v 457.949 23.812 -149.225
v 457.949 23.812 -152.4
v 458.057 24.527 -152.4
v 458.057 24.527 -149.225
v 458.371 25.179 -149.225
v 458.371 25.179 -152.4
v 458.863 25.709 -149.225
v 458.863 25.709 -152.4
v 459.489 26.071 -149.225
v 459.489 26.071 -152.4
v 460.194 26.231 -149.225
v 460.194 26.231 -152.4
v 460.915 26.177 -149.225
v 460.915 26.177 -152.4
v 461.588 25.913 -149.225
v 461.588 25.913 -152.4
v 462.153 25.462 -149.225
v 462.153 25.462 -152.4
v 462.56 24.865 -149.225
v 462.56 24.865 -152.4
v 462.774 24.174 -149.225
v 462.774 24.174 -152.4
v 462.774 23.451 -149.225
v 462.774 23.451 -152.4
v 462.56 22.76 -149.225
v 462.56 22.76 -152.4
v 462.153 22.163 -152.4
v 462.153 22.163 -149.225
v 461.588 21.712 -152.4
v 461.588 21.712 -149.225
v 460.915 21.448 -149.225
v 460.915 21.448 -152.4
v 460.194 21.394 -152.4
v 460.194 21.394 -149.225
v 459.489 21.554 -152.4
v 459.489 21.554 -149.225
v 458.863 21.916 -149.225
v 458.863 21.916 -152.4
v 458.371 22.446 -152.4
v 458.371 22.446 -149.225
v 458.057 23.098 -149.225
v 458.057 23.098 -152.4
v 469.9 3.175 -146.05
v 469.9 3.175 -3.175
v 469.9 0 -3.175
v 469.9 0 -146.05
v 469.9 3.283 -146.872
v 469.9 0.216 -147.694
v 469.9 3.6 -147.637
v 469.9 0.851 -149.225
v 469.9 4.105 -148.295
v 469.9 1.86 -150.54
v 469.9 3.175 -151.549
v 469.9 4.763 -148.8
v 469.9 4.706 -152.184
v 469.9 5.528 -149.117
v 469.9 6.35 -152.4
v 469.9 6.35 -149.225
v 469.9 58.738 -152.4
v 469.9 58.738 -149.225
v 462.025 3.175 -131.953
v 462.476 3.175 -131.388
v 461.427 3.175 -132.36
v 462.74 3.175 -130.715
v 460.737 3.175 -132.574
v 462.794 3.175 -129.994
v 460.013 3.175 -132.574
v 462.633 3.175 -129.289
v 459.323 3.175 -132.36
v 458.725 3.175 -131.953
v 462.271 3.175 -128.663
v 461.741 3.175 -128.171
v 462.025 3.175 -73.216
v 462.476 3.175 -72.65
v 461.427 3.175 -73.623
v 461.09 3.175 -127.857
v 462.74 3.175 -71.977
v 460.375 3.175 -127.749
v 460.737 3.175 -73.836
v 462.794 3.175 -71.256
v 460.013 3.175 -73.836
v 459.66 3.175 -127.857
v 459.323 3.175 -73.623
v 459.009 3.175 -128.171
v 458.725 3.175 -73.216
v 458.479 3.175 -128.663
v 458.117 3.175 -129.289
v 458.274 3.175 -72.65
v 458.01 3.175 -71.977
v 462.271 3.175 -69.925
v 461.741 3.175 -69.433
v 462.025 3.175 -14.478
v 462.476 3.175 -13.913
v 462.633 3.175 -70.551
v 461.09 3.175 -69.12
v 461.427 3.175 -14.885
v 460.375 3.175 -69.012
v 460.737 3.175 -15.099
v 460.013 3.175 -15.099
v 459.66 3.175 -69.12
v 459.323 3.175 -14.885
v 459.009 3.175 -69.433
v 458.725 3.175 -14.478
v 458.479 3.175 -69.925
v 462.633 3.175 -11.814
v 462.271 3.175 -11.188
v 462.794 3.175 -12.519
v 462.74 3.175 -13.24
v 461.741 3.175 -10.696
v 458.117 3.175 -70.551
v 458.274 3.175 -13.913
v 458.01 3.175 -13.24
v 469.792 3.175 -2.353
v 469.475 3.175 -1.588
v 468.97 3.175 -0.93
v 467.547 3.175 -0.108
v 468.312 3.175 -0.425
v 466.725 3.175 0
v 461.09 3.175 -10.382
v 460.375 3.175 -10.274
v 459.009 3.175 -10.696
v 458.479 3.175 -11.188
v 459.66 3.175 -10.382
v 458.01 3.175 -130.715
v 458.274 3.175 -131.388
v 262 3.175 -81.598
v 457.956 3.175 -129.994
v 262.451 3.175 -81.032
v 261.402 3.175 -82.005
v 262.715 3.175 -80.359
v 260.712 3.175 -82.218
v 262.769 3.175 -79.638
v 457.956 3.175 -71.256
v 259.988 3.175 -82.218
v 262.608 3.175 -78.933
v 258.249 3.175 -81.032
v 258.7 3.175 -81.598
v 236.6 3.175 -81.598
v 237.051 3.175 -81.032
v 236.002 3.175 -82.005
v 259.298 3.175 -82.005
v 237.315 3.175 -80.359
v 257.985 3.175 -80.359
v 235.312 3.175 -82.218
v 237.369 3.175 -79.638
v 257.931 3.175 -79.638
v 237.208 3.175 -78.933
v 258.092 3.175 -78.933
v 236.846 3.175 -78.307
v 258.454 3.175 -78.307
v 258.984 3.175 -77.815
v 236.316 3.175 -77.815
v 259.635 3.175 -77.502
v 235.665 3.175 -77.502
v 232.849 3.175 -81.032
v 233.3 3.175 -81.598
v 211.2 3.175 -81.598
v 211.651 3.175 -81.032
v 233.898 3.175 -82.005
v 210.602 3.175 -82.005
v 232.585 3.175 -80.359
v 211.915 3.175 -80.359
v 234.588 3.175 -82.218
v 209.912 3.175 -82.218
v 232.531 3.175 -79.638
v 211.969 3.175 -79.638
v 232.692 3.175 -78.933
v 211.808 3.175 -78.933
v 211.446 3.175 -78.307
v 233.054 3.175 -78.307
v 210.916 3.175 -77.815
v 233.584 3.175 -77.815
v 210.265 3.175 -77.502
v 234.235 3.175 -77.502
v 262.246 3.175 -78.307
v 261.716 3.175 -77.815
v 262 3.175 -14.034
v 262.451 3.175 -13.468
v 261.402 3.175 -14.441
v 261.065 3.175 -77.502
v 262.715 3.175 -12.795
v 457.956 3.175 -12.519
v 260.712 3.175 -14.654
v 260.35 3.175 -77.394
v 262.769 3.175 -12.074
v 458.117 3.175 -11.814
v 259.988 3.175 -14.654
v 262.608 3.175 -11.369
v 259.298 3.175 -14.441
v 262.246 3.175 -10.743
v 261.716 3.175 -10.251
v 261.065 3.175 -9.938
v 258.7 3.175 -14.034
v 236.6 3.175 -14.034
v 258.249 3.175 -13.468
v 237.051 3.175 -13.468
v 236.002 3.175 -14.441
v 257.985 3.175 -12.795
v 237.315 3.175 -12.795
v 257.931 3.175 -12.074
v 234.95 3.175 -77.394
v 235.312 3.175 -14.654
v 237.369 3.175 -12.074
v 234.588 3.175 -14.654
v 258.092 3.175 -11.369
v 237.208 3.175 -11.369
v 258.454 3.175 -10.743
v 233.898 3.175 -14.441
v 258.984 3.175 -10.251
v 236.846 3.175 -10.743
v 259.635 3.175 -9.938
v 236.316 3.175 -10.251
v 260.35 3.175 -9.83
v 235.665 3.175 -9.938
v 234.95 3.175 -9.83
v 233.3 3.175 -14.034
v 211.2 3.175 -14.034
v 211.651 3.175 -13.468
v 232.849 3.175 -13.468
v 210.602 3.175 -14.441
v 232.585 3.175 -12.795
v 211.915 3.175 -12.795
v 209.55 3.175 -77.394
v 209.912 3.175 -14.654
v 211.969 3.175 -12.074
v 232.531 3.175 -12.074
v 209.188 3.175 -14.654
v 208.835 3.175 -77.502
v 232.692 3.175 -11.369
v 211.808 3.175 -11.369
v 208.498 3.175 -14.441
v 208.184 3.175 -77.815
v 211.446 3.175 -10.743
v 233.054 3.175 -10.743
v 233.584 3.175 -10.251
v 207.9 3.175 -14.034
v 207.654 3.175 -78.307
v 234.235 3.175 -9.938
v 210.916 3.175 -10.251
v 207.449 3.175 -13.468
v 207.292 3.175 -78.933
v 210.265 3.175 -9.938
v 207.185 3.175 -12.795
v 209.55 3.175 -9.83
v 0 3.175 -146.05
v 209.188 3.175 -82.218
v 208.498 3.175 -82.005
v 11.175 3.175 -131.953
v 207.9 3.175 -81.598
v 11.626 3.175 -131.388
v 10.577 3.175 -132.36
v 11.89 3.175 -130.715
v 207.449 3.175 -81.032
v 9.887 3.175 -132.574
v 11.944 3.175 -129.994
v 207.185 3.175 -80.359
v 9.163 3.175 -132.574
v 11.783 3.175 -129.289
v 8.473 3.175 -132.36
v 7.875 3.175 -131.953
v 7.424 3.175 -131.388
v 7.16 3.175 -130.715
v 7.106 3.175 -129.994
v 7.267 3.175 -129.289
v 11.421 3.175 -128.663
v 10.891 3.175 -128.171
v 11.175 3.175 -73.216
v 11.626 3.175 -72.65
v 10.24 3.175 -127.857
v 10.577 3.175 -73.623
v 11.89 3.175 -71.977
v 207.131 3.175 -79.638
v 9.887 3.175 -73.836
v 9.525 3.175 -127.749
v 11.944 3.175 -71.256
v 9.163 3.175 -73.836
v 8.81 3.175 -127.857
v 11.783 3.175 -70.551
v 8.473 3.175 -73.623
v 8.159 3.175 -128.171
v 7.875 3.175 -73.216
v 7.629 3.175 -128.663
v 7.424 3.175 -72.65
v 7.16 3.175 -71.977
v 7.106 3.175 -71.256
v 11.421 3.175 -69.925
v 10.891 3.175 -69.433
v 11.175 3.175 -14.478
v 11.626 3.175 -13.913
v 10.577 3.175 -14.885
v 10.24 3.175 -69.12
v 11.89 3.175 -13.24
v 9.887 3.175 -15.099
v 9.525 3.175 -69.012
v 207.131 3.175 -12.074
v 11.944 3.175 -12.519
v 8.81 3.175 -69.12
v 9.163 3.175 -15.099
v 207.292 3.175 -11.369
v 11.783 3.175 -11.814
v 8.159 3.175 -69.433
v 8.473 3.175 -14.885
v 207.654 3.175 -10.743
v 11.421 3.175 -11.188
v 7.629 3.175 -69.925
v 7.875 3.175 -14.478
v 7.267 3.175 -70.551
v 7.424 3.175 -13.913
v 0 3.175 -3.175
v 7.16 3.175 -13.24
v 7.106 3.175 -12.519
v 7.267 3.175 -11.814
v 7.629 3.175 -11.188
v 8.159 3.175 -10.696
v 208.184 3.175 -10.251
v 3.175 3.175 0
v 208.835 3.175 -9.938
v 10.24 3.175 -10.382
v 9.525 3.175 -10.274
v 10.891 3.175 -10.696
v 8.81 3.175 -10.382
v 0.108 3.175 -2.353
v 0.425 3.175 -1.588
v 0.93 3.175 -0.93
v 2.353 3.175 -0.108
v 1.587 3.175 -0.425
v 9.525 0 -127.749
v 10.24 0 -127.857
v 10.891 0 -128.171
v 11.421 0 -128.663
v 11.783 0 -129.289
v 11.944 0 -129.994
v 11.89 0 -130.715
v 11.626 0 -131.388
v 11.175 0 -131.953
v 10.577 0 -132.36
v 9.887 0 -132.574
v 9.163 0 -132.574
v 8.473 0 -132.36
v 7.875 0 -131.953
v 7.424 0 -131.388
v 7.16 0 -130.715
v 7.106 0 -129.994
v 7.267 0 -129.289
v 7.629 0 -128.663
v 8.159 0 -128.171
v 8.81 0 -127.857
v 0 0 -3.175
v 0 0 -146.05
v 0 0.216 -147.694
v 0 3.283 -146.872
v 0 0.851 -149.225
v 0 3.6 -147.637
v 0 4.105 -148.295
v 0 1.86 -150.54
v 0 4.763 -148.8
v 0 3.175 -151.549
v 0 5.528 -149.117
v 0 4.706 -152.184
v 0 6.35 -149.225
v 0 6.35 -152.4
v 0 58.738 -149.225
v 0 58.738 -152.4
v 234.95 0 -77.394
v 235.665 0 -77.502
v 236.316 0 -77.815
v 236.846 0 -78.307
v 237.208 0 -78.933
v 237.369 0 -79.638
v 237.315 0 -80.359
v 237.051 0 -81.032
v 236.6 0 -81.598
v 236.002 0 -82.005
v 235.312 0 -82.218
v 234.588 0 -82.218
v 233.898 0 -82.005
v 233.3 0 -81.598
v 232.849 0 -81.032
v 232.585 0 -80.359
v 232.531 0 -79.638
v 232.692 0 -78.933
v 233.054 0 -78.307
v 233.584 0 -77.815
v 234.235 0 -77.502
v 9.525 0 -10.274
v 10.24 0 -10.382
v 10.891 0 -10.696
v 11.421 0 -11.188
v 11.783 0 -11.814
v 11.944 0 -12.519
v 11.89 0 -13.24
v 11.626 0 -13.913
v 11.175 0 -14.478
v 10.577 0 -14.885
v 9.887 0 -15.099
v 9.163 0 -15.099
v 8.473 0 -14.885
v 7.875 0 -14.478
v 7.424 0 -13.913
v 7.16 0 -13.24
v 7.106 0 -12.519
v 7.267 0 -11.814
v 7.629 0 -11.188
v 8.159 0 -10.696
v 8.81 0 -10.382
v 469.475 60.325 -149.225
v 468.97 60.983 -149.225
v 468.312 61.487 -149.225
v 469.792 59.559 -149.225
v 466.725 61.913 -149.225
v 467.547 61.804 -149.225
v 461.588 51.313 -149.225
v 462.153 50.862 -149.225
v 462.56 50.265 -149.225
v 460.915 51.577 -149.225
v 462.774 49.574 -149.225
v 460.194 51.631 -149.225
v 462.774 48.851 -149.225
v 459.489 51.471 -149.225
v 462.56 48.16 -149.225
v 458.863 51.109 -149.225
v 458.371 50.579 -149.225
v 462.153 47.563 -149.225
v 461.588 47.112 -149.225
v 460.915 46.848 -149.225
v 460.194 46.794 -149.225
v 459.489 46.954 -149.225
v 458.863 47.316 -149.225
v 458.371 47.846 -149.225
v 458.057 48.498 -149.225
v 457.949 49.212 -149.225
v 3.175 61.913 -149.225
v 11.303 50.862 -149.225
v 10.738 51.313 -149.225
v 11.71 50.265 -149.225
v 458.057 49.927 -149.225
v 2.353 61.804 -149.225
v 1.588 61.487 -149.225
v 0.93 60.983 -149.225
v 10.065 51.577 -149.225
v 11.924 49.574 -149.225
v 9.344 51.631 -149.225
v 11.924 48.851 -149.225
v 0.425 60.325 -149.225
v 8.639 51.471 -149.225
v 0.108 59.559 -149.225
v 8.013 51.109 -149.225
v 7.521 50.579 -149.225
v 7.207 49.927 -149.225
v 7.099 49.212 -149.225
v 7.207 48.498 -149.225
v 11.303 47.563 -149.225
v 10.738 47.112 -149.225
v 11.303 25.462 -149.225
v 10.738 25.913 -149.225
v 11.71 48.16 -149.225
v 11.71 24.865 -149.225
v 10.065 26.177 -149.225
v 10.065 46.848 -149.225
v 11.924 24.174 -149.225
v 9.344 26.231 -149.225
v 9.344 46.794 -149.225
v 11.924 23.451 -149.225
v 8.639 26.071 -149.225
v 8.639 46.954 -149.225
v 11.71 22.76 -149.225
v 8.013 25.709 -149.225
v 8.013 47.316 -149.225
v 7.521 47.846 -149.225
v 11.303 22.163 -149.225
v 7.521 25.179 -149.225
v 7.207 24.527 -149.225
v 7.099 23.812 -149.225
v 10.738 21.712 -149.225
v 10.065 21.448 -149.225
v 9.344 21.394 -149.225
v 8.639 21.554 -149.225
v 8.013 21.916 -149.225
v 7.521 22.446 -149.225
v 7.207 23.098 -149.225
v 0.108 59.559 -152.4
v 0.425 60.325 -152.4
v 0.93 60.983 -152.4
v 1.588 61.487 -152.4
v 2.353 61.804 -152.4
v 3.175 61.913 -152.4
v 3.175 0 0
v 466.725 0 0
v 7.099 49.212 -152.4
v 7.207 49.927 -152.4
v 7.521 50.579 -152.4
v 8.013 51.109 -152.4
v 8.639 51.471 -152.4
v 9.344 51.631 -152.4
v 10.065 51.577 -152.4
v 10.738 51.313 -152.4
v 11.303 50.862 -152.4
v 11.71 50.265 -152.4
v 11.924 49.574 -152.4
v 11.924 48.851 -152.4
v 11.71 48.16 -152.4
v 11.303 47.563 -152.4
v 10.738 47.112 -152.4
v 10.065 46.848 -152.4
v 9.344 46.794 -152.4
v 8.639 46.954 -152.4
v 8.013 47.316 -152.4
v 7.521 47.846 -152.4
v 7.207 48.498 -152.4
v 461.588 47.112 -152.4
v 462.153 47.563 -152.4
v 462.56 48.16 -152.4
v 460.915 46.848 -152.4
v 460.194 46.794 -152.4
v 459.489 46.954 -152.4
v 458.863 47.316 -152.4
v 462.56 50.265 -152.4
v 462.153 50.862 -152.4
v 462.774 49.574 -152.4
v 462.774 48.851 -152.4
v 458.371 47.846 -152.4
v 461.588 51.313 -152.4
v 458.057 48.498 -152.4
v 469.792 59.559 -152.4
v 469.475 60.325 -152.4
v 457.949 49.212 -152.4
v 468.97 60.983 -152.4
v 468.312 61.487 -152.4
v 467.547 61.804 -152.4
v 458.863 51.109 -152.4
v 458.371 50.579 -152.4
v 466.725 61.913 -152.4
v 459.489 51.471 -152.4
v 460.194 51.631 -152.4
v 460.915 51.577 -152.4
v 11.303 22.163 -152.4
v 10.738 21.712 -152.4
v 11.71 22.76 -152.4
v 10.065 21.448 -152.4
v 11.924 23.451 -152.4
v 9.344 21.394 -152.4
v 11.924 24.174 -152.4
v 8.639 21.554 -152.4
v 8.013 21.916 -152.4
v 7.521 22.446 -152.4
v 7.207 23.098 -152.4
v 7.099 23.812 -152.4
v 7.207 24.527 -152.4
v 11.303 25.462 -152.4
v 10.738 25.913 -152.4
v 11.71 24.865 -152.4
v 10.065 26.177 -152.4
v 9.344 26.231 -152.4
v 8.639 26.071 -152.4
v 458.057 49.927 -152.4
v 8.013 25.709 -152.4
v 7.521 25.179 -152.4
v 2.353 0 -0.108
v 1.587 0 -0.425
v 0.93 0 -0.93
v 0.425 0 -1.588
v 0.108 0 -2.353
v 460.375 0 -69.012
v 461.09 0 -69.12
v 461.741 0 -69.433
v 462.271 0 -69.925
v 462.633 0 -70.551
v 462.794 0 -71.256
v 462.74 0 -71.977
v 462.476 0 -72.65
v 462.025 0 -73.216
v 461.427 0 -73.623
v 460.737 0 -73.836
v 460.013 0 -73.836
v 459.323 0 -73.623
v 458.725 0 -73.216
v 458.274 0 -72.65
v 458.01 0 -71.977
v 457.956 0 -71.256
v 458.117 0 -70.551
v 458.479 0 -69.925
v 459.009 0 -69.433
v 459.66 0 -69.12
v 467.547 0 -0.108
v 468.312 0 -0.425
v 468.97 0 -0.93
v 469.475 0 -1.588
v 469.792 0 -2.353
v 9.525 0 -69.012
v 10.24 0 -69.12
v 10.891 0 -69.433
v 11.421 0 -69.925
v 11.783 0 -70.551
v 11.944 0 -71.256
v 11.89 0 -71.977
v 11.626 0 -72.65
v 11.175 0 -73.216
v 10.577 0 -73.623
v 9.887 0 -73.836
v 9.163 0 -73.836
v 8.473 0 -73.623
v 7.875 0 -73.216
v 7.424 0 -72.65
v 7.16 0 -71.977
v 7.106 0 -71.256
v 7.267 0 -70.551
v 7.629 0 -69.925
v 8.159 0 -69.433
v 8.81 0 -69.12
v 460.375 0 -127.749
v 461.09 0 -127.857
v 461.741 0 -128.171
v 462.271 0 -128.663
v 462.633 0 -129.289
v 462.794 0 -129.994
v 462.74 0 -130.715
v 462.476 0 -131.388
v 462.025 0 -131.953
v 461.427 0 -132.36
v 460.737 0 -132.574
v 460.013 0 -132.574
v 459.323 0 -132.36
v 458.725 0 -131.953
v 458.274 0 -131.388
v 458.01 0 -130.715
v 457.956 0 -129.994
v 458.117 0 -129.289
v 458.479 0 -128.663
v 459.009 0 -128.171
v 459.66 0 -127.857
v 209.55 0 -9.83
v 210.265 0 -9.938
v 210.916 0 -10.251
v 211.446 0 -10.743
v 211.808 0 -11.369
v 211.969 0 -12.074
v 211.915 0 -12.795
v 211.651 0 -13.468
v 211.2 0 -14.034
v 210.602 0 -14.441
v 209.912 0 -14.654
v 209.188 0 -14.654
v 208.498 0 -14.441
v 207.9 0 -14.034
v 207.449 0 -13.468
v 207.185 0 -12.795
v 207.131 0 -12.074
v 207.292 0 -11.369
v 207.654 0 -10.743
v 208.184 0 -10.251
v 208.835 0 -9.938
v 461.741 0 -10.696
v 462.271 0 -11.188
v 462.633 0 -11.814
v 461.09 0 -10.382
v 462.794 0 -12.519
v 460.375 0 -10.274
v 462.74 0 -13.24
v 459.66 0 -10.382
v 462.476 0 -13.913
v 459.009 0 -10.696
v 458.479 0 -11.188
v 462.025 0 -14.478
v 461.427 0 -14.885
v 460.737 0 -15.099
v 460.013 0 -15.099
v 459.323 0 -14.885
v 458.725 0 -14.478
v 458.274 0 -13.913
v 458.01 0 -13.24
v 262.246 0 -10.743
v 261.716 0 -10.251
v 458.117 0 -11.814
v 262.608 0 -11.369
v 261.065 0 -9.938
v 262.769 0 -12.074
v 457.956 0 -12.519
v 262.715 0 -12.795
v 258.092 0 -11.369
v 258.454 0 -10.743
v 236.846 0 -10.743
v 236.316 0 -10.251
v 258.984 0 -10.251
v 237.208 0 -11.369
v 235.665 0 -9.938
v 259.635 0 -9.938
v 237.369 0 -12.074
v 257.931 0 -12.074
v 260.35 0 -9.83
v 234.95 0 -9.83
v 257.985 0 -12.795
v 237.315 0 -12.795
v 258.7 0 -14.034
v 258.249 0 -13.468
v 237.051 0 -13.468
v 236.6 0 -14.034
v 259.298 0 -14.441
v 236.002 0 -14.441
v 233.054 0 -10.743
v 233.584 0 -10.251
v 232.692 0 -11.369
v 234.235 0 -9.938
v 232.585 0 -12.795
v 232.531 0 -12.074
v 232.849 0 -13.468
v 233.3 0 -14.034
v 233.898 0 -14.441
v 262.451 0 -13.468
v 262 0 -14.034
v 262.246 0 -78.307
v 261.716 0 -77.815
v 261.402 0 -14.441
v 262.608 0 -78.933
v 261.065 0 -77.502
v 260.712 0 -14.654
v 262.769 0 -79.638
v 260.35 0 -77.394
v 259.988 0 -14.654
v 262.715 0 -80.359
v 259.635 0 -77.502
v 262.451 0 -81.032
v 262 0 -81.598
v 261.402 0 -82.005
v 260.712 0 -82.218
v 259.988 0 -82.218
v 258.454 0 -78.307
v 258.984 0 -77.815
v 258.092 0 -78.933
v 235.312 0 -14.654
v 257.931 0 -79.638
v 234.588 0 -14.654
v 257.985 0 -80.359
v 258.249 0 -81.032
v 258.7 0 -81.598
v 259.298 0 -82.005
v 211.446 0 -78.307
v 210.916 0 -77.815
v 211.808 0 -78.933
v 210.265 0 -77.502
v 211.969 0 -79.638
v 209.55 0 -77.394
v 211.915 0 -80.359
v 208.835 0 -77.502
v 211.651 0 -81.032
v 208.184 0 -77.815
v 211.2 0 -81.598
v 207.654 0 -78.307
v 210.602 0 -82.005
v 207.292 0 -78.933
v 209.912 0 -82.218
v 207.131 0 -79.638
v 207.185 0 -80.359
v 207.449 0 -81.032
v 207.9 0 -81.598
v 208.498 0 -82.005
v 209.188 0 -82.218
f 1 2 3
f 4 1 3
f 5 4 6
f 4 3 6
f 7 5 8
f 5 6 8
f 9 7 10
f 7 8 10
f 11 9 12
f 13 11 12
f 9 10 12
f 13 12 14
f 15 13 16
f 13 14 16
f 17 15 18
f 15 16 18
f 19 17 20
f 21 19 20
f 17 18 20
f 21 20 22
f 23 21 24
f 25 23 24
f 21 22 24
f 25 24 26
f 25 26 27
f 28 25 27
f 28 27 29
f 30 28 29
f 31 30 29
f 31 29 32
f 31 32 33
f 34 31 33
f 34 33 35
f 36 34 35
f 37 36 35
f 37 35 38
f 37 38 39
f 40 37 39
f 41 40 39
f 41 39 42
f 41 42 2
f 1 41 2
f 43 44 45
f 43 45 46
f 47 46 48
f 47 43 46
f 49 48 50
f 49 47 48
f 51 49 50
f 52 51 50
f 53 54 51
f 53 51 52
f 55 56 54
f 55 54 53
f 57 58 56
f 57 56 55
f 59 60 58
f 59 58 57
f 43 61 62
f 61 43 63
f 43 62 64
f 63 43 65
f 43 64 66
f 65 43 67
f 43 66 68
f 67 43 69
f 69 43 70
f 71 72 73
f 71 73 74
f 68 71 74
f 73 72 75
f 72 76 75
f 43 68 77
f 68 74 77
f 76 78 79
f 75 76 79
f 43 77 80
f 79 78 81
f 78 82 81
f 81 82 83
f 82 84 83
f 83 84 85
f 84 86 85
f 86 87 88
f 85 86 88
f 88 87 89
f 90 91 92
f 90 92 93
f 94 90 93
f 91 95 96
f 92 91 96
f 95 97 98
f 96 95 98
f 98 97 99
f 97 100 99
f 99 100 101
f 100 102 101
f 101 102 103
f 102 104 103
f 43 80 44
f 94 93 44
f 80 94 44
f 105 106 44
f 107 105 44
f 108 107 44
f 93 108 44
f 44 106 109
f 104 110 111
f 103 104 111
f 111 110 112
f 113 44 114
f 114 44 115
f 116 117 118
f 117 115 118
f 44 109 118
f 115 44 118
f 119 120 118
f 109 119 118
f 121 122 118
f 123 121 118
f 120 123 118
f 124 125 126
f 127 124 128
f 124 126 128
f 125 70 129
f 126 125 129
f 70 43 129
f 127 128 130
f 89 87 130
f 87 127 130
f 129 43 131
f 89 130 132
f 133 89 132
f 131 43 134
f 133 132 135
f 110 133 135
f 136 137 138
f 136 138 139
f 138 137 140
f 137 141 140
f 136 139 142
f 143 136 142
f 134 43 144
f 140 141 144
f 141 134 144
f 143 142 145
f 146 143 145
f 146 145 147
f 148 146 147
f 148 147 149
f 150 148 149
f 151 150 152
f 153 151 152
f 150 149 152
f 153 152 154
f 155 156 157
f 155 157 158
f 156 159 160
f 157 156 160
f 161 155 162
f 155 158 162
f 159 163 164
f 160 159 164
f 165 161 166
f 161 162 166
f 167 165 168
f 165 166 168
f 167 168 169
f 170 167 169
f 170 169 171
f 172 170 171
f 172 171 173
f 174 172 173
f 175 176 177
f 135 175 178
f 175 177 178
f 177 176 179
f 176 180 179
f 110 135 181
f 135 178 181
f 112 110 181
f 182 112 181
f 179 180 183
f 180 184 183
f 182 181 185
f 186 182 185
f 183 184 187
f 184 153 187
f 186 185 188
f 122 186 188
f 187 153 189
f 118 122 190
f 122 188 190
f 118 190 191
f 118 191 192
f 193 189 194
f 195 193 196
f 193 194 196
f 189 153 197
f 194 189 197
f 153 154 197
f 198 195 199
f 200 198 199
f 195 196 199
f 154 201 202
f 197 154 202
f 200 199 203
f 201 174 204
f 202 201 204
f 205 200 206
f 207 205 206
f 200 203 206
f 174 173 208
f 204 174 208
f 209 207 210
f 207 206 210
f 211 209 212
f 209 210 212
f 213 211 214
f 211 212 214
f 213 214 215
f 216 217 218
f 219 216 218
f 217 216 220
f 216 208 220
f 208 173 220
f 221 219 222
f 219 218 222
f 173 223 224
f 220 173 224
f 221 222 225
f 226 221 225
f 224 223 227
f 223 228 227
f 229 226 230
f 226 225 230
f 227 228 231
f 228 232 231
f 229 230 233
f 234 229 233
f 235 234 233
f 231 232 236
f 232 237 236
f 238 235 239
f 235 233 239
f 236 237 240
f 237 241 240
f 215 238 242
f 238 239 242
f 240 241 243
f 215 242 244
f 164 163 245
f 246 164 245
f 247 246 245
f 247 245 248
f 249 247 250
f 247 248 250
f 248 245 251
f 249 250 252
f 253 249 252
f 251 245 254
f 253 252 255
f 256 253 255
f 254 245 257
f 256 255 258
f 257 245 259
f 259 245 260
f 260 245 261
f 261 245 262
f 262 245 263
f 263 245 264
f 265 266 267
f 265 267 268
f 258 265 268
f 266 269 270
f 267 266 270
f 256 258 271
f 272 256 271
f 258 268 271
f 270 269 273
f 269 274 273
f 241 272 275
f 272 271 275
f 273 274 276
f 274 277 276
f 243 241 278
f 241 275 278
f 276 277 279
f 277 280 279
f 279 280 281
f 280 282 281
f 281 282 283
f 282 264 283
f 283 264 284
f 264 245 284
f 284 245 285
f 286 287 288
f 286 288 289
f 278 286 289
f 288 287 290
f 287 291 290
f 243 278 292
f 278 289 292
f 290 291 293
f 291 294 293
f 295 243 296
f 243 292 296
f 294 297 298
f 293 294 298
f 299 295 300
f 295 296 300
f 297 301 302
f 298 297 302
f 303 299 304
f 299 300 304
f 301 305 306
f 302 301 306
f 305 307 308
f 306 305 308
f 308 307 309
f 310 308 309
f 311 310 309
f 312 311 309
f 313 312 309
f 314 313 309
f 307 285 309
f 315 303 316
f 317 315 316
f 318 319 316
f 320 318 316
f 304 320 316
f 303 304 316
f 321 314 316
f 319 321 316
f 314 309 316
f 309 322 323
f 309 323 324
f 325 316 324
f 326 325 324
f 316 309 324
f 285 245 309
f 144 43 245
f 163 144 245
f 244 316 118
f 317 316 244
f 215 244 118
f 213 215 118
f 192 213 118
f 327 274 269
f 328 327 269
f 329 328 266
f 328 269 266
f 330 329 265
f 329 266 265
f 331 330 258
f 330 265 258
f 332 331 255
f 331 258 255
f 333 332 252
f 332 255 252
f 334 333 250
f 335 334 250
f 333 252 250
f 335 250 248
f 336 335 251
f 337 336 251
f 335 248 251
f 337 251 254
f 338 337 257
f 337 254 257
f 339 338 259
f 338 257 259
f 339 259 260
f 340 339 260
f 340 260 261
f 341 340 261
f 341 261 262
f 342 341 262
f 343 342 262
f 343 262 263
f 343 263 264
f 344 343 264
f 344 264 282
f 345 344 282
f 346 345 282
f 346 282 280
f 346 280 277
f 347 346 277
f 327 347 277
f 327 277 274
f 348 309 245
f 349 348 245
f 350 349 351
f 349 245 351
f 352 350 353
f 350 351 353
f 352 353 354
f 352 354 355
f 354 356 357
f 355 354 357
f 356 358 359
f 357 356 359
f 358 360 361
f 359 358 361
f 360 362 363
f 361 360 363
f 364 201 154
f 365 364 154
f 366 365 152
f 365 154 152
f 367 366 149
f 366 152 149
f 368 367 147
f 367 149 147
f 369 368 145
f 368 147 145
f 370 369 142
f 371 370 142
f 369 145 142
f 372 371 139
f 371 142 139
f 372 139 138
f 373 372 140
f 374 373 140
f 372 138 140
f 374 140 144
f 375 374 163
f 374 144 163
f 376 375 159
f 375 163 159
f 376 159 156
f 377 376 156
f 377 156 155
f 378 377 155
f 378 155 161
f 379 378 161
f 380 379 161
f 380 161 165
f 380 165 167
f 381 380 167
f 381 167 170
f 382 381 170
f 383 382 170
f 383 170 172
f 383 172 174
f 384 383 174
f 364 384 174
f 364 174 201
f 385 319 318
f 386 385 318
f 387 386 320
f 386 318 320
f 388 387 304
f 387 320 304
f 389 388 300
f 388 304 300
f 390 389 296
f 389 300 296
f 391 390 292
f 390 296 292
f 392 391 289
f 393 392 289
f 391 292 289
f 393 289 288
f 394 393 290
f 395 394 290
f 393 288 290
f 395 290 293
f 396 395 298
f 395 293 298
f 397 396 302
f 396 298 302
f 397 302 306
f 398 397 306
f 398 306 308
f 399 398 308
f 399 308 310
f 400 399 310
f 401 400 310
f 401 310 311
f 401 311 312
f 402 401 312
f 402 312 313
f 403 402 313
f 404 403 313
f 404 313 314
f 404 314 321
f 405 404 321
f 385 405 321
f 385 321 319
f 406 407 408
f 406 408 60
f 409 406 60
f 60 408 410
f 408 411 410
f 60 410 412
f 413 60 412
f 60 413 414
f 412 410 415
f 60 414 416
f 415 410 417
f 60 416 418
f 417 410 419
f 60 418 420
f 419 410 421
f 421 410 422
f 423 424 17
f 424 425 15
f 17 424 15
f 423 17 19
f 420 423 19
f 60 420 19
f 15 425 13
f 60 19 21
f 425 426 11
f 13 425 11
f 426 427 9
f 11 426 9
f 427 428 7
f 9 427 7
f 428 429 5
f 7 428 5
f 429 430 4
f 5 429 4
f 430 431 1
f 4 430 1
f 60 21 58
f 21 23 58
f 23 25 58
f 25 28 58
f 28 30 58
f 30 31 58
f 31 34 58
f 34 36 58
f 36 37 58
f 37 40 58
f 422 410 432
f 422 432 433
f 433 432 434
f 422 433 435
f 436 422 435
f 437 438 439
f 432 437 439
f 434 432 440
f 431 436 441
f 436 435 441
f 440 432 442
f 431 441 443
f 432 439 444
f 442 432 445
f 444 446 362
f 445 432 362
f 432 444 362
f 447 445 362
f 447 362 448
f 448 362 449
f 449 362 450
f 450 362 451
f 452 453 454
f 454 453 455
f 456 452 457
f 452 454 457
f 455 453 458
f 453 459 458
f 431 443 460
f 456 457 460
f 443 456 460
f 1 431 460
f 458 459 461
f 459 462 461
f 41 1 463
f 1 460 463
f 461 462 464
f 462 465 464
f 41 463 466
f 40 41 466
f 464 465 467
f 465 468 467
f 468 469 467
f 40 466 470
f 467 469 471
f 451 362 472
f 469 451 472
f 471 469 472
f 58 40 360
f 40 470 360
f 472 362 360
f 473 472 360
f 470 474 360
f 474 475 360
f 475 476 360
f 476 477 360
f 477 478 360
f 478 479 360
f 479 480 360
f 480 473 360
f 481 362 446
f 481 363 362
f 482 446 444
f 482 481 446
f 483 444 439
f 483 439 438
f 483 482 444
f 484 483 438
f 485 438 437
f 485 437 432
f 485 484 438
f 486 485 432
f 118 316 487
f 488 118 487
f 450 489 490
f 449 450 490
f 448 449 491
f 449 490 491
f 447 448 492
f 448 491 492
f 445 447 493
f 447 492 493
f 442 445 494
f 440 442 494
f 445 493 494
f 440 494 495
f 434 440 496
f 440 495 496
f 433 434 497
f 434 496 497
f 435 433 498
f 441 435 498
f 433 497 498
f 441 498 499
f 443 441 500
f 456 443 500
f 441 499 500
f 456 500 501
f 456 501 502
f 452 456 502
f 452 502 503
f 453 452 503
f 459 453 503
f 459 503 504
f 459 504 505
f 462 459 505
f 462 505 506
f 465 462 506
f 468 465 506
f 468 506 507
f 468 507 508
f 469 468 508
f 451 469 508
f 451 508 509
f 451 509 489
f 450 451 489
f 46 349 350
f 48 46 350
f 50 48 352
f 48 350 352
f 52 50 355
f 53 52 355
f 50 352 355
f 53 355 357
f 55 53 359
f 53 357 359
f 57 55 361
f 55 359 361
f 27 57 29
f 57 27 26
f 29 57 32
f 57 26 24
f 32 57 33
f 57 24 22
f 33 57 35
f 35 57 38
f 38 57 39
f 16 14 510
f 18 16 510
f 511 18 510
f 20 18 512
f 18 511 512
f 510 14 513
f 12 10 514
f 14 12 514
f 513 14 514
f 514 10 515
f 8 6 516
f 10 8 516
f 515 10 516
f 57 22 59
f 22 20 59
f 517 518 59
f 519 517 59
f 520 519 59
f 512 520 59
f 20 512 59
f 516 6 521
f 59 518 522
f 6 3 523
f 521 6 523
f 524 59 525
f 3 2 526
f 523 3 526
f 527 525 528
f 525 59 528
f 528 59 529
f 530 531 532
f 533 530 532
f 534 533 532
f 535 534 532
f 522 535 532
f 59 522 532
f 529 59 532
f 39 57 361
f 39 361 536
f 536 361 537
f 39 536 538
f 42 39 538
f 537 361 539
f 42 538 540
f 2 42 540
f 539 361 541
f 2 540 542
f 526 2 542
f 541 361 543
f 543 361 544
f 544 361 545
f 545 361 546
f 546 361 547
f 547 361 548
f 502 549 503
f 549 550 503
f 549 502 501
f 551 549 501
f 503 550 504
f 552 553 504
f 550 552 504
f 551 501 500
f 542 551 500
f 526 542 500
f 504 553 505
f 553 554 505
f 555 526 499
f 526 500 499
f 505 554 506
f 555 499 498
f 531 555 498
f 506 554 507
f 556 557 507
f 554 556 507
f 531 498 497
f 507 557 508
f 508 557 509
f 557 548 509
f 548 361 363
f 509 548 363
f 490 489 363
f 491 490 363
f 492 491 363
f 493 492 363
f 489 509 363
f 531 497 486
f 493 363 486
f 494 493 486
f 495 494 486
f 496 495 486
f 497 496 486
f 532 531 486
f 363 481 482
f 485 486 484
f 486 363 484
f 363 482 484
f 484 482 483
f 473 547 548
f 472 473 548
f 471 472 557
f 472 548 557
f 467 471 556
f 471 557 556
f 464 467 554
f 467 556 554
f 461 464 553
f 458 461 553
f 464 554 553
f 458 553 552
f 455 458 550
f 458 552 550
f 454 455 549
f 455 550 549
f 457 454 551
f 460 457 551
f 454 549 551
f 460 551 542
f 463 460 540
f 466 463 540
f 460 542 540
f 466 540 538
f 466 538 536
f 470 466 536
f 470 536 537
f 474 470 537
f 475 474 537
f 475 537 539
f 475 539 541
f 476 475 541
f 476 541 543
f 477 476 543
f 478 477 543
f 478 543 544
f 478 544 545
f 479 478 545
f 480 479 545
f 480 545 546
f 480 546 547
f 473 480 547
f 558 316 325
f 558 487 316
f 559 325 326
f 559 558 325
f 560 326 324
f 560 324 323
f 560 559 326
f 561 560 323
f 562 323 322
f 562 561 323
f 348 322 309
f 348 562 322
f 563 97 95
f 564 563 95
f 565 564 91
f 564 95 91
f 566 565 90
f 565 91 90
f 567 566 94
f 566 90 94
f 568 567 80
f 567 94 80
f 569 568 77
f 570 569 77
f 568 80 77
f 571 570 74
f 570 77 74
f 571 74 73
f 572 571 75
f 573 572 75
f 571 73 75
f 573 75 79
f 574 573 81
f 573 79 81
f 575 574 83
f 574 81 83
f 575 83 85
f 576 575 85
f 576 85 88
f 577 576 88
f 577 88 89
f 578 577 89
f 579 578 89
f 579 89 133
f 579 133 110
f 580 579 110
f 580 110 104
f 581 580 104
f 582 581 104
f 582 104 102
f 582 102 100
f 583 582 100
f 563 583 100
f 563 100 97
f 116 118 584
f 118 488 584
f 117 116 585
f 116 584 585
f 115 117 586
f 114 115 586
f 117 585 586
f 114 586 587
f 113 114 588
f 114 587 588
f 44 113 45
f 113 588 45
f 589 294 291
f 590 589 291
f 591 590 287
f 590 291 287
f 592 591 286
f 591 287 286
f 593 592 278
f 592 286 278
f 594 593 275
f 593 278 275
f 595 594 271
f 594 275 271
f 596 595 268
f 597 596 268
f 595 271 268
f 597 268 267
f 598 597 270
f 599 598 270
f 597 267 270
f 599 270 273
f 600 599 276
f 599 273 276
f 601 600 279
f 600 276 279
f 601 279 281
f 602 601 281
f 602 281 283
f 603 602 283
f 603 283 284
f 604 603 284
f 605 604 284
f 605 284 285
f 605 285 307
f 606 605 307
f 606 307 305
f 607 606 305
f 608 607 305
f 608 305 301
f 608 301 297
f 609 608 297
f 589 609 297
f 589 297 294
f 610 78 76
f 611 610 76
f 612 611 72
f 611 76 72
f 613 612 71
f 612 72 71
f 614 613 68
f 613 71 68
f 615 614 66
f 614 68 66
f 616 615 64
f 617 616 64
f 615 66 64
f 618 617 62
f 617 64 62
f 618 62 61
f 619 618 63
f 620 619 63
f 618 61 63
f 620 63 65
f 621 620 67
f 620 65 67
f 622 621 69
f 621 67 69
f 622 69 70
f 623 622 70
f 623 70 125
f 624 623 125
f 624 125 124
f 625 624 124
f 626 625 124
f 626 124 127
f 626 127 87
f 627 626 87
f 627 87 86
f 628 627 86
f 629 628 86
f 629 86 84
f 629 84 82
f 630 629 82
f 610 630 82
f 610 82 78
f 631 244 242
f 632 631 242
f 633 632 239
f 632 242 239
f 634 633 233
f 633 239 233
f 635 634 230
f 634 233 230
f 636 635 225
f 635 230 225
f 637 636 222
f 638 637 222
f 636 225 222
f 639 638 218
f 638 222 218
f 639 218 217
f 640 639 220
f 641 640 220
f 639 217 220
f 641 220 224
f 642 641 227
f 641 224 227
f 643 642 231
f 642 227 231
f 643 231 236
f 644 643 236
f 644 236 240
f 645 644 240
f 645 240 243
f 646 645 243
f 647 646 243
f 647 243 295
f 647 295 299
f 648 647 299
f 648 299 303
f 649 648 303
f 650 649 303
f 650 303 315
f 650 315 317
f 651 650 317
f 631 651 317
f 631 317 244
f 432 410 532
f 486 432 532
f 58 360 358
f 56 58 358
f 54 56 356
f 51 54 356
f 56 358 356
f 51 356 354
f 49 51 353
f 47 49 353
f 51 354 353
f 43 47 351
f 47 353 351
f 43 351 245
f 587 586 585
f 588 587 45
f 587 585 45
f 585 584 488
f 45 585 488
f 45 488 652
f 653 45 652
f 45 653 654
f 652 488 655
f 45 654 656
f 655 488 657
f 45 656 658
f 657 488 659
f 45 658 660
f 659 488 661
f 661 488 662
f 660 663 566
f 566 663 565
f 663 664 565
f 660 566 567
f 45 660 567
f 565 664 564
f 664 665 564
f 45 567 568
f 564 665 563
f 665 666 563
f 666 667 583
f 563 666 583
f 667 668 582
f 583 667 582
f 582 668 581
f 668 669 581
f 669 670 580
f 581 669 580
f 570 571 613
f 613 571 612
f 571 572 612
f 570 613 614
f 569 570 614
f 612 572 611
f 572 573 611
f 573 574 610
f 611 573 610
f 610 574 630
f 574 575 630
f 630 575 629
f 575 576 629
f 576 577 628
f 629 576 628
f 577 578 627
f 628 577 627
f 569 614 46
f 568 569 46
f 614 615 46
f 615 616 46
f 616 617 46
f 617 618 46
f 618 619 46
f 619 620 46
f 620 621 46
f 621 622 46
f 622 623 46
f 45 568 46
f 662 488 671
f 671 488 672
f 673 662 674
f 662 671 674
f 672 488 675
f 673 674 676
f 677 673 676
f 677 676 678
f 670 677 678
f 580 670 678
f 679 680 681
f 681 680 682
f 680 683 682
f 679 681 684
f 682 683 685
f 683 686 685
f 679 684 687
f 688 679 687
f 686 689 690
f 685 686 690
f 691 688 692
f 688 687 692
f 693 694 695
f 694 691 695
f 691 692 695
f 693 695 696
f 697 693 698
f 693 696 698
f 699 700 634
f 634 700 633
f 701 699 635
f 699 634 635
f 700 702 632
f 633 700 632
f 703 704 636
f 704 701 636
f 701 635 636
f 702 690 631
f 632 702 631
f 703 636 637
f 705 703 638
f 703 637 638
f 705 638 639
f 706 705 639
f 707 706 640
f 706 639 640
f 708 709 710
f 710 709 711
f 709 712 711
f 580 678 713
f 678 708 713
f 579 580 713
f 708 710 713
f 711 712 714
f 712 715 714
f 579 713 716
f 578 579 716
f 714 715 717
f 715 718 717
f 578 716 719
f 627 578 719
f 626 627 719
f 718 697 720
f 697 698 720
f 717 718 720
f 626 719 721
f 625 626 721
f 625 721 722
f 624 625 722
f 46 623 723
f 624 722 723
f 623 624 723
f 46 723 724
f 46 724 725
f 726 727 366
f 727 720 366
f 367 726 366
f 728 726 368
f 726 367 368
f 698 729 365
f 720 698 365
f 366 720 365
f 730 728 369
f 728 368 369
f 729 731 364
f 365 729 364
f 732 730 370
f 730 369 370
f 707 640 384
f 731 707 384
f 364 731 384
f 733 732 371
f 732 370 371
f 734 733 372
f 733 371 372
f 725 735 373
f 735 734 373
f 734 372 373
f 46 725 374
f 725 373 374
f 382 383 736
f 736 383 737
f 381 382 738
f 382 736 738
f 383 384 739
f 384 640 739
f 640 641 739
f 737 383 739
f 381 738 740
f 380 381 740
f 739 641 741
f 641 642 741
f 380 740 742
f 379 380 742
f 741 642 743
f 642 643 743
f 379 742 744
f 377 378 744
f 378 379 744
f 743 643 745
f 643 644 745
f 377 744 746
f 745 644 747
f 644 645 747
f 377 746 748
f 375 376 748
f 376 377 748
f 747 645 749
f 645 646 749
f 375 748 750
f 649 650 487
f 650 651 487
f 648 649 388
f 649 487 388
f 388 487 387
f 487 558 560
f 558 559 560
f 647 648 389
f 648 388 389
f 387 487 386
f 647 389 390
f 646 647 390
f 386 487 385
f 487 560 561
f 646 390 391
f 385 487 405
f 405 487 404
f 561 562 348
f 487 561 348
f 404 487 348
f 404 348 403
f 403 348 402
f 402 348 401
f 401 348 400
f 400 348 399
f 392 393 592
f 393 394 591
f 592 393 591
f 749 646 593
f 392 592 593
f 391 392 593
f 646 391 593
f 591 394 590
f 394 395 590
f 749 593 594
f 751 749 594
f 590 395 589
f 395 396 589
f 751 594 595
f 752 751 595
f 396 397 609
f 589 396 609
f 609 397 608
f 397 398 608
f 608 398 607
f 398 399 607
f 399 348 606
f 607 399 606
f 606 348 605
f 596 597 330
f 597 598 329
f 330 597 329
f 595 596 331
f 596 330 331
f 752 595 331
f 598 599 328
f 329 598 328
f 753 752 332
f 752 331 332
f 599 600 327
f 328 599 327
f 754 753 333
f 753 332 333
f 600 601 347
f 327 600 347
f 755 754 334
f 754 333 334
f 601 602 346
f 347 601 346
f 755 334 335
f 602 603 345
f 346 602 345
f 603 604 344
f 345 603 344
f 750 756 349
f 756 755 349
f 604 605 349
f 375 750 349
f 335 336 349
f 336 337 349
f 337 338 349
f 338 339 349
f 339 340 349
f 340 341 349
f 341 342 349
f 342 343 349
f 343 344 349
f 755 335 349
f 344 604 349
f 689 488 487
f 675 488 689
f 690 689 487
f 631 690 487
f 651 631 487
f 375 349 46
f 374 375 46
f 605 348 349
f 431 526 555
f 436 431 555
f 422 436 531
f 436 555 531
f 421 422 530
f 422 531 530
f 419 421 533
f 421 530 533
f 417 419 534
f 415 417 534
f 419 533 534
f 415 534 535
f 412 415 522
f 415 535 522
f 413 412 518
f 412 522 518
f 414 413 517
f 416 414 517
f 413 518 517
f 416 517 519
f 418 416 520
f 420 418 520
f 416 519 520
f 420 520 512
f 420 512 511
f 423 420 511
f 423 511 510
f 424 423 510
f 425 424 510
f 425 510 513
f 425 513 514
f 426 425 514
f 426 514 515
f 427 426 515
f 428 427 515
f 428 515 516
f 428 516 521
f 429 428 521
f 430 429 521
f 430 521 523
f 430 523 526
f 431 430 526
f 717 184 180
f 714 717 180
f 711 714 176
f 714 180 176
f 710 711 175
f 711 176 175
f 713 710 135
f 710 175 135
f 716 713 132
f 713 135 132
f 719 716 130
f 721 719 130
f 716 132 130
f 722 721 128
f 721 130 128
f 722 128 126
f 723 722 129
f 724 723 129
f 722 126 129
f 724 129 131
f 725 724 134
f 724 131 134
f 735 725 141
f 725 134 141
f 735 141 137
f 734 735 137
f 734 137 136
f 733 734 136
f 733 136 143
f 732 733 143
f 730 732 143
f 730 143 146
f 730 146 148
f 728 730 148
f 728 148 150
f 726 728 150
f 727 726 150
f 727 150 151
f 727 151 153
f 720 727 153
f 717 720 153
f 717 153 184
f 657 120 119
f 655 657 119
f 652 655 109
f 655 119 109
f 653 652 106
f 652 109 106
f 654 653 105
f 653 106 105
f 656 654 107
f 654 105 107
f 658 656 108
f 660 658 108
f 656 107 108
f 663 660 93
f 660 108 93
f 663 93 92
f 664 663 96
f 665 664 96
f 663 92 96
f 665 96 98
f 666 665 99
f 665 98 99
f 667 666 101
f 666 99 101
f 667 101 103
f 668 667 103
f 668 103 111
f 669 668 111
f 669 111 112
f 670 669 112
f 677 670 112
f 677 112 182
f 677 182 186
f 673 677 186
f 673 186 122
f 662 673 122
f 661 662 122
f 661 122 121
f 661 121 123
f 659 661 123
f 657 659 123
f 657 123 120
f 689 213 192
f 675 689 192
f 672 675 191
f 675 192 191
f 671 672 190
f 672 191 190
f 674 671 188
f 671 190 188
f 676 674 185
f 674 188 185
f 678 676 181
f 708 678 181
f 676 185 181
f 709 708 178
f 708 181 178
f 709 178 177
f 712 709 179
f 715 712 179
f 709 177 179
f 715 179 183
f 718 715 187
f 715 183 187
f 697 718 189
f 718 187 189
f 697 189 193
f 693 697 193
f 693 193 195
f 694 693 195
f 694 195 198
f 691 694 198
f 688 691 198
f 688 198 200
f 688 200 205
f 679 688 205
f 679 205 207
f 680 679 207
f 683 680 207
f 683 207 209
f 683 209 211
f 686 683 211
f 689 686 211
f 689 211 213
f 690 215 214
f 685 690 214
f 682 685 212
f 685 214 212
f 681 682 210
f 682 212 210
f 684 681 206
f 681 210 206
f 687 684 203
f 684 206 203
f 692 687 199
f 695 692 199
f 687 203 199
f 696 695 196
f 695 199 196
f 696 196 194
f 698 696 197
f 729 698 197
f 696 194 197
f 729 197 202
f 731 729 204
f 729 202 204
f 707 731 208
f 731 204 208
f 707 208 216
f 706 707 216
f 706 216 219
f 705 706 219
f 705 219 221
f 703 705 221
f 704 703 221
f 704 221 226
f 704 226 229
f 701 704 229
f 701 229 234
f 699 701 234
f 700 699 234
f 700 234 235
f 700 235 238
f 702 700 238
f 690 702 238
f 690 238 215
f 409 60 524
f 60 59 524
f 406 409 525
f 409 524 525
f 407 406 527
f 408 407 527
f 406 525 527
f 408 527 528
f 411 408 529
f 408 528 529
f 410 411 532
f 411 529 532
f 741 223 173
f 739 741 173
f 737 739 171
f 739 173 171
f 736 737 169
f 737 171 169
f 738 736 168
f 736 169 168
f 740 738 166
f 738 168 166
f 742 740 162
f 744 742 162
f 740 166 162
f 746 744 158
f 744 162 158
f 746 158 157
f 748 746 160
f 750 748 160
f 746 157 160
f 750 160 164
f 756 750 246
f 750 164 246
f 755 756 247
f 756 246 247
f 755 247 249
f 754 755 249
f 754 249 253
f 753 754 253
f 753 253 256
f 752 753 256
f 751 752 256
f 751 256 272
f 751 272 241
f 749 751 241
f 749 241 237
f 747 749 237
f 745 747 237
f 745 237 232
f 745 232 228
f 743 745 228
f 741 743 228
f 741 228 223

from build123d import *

# Parameters (mm, degrees)
BASE_FLANGE1_DEPTH = 469.9
SKETCH6_R          = 21.9075
CUT_EXTRUDE1_DEPTH = 3.175
SKETCH7_R          = 2.4257
CUT_EXTRUDE2_DEPTH = 510.278313523
SKETCH8_R          = 2.4257
CUT_EXTRUDE3_DEPTH = 510.278313523
SKETCH9_R          = 2.4257
CUT_EXTRUDE4_DEPTH = 510.278313523
FILLET1_R          = 3.175
SKETCH10_W         = 152.4
SKETCH10_H         = 61.9125
CUT_EXTRUDE6_DEPTH = 510.278313523
FILLET2_R          = 3.175


# Sheet-metal steps are written as plain solids
with BuildPart() as part:
    # Sketch1 → Base-Flange1 (new body)
    with BuildSketch(Plane(origin=(0, 0, 0), x_dir=(0, 0, -1), z_dir=(1, 0, 0))):
        with BuildLine():
            Line((0, 0), (146.05, 0))
            ThreePointArc((146.05, 0), (150.540128061, 1.859871939), (152.4, 6.35))
            Line((152.4, 6.35), (152.4, 117.475))
            ThreePointArc((152.4, 117.475), (150.540128061, 121.965128061), (146.05, 123.825))
            Line((146.05, 123.825), (0, 123.825))
            Line((0, 123.825), (0, 120.65))
            Line((0, 120.65), (146.05, 120.65))
            ThreePointArc((146.05, 120.65), (148.29506403, 119.72006403), (149.225, 117.475))
            Line((149.225, 117.475), (149.225, 6.35))
            ThreePointArc((149.225, 6.35), (148.29506403, 4.10493597), (146.05, 3.175))
            Line((146.05, 3.175), (0, 3.175))
            Line((0, 3.175), (0, 0))
        make_face()
    extrude(amount=BASE_FLANGE1_DEPTH)

    # Sketch6 → Cut-Extrude1 (cut)
    with BuildSketch(Plane(origin=(0, 123.825, 0), x_dir=(1, 0, 0), z_dir=(0, 1, 0))):
        with Locations(Location((234.95, 46.0375, 0), (0, 0, 270))):
            Circle(SKETCH6_R)
    extrude(amount=-CUT_EXTRUDE1_DEPTH, mode=Mode.SUBTRACT)

    # Sketch7 → Cut-Extrude2 (cut, through all)
    with BuildSketch(Plane(origin=(0, 123.825, 0), x_dir=(1, 0, 0), z_dir=(0, 1, 0))):
        with Locations(Location((234.95, 12.2555, 0), (0, 0, 270))):
            Circle(SKETCH7_R)
        with Locations(Location((234.95, 79.8195, 0), (0, 0, 270))):
            Circle(SKETCH7_R)
        with Locations(Location((209.55, 12.2555, 0), (0, 0, 270))):
            Circle(SKETCH7_R)
        with Locations(Location((260.35, 12.2555, 0), (0, 0, 270))):
            Circle(SKETCH7_R)
        with Locations(Location((260.35, 79.8195, 0), (0, 0, 270))):
            Circle(SKETCH7_R)
        with Locations(Location((209.55, 79.8195, 0), (0, 0, 270))):
            Circle(SKETCH7_R)
    extrude(amount=-CUT_EXTRUDE2_DEPTH, mode=Mode.SUBTRACT)

    # Sketch8 → Cut-Extrude3 (cut, through all)
    with BuildSketch(Plane(origin=(0, 123.825, 0), x_dir=(1, 0, 0), z_dir=(0, 1, 0))):
        with Locations(Location((460.375, 12.7, 0), (0, 0, 270))):
            Circle(SKETCH8_R)
        with Locations(Location((460.375, 71.4375, 0), (0, 0, 270))):
            Circle(SKETCH8_R)
        with Locations(Location((460.375, 130.175, 0), (0, 0, 270))):
            Circle(SKETCH8_R)
        with Locations(Location((9.525, 130.175, 0), (0, 0, 270))):
            Circle(SKETCH8_R)
        with Locations(Location((9.525, 71.4375, 0), (0, 0, 270))):
            Circle(SKETCH8_R)
        with Locations(Location((9.525, 12.7, 0), (0, 0, 270))):
            Circle(SKETCH8_R)
    extrude(amount=-CUT_EXTRUDE3_DEPTH, mode=Mode.SUBTRACT)

    # Sketch9 → Cut-Extrude4 (cut, through all)
    with BuildSketch(Plane(origin=(0, 0, -152.4), x_dir=(-1, 0, 0), z_dir=(0, 0, -1))):
        with Locations((-460.375, 74.6125)):
            Circle(SKETCH9_R)
        with Locations((-460.375, 49.2125)):
            Circle(SKETCH9_R)
        with Locations((-9.525, 49.2125)):
            Circle(SKETCH9_R)
        with Locations((-9.525, 74.6125)):
            Circle(SKETCH9_R)
        with Locations((-460.375, 100.0125)):
            Circle(SKETCH9_R)
        with Locations((-460.375, 23.8125)):
            Circle(SKETCH9_R)
        with Locations((-9.525, 23.8125)):
            Circle(SKETCH9_R)
        with Locations((-9.525, 100.0125)):
            Circle(SKETCH9_R)
    extrude(amount=-CUT_EXTRUDE4_DEPTH, mode=Mode.SUBTRACT)

    # Fillet1
    fillet1_edges = [part.edges().sort_by_distance(p)[0] for p in [
        (0, 1.5875, 0),
        (0, 122.2375, 0),
        (469.9, 1.5875, 0),
        (469.9, 122.2375, 0),
    ]]
    fillet(fillet1_edges, radius=FILLET1_R)

    # Sketch10 → Cut-Extrude6 (cut, through all)
    with BuildSketch(Plane(origin=(469.9, 0, 0), x_dir=(0, 0, -1), z_dir=(1, 0, 0))):
        with Locations((76.2, 92.86875)):
            Rectangle(SKETCH10_W, SKETCH10_H)
    extrude(amount=-CUT_EXTRUDE6_DEPTH, mode=Mode.SUBTRACT)

    # Fillet2
    fillet2_edges = [part.edges().sort_by_distance(p)[0] for p in [
        (469.9, 61.9125, -150.8125),
        (0, 61.9125, -150.8125),
    ]]
    fillet(fillet2_edges, radius=FILLET2_R)


solid = part.part
